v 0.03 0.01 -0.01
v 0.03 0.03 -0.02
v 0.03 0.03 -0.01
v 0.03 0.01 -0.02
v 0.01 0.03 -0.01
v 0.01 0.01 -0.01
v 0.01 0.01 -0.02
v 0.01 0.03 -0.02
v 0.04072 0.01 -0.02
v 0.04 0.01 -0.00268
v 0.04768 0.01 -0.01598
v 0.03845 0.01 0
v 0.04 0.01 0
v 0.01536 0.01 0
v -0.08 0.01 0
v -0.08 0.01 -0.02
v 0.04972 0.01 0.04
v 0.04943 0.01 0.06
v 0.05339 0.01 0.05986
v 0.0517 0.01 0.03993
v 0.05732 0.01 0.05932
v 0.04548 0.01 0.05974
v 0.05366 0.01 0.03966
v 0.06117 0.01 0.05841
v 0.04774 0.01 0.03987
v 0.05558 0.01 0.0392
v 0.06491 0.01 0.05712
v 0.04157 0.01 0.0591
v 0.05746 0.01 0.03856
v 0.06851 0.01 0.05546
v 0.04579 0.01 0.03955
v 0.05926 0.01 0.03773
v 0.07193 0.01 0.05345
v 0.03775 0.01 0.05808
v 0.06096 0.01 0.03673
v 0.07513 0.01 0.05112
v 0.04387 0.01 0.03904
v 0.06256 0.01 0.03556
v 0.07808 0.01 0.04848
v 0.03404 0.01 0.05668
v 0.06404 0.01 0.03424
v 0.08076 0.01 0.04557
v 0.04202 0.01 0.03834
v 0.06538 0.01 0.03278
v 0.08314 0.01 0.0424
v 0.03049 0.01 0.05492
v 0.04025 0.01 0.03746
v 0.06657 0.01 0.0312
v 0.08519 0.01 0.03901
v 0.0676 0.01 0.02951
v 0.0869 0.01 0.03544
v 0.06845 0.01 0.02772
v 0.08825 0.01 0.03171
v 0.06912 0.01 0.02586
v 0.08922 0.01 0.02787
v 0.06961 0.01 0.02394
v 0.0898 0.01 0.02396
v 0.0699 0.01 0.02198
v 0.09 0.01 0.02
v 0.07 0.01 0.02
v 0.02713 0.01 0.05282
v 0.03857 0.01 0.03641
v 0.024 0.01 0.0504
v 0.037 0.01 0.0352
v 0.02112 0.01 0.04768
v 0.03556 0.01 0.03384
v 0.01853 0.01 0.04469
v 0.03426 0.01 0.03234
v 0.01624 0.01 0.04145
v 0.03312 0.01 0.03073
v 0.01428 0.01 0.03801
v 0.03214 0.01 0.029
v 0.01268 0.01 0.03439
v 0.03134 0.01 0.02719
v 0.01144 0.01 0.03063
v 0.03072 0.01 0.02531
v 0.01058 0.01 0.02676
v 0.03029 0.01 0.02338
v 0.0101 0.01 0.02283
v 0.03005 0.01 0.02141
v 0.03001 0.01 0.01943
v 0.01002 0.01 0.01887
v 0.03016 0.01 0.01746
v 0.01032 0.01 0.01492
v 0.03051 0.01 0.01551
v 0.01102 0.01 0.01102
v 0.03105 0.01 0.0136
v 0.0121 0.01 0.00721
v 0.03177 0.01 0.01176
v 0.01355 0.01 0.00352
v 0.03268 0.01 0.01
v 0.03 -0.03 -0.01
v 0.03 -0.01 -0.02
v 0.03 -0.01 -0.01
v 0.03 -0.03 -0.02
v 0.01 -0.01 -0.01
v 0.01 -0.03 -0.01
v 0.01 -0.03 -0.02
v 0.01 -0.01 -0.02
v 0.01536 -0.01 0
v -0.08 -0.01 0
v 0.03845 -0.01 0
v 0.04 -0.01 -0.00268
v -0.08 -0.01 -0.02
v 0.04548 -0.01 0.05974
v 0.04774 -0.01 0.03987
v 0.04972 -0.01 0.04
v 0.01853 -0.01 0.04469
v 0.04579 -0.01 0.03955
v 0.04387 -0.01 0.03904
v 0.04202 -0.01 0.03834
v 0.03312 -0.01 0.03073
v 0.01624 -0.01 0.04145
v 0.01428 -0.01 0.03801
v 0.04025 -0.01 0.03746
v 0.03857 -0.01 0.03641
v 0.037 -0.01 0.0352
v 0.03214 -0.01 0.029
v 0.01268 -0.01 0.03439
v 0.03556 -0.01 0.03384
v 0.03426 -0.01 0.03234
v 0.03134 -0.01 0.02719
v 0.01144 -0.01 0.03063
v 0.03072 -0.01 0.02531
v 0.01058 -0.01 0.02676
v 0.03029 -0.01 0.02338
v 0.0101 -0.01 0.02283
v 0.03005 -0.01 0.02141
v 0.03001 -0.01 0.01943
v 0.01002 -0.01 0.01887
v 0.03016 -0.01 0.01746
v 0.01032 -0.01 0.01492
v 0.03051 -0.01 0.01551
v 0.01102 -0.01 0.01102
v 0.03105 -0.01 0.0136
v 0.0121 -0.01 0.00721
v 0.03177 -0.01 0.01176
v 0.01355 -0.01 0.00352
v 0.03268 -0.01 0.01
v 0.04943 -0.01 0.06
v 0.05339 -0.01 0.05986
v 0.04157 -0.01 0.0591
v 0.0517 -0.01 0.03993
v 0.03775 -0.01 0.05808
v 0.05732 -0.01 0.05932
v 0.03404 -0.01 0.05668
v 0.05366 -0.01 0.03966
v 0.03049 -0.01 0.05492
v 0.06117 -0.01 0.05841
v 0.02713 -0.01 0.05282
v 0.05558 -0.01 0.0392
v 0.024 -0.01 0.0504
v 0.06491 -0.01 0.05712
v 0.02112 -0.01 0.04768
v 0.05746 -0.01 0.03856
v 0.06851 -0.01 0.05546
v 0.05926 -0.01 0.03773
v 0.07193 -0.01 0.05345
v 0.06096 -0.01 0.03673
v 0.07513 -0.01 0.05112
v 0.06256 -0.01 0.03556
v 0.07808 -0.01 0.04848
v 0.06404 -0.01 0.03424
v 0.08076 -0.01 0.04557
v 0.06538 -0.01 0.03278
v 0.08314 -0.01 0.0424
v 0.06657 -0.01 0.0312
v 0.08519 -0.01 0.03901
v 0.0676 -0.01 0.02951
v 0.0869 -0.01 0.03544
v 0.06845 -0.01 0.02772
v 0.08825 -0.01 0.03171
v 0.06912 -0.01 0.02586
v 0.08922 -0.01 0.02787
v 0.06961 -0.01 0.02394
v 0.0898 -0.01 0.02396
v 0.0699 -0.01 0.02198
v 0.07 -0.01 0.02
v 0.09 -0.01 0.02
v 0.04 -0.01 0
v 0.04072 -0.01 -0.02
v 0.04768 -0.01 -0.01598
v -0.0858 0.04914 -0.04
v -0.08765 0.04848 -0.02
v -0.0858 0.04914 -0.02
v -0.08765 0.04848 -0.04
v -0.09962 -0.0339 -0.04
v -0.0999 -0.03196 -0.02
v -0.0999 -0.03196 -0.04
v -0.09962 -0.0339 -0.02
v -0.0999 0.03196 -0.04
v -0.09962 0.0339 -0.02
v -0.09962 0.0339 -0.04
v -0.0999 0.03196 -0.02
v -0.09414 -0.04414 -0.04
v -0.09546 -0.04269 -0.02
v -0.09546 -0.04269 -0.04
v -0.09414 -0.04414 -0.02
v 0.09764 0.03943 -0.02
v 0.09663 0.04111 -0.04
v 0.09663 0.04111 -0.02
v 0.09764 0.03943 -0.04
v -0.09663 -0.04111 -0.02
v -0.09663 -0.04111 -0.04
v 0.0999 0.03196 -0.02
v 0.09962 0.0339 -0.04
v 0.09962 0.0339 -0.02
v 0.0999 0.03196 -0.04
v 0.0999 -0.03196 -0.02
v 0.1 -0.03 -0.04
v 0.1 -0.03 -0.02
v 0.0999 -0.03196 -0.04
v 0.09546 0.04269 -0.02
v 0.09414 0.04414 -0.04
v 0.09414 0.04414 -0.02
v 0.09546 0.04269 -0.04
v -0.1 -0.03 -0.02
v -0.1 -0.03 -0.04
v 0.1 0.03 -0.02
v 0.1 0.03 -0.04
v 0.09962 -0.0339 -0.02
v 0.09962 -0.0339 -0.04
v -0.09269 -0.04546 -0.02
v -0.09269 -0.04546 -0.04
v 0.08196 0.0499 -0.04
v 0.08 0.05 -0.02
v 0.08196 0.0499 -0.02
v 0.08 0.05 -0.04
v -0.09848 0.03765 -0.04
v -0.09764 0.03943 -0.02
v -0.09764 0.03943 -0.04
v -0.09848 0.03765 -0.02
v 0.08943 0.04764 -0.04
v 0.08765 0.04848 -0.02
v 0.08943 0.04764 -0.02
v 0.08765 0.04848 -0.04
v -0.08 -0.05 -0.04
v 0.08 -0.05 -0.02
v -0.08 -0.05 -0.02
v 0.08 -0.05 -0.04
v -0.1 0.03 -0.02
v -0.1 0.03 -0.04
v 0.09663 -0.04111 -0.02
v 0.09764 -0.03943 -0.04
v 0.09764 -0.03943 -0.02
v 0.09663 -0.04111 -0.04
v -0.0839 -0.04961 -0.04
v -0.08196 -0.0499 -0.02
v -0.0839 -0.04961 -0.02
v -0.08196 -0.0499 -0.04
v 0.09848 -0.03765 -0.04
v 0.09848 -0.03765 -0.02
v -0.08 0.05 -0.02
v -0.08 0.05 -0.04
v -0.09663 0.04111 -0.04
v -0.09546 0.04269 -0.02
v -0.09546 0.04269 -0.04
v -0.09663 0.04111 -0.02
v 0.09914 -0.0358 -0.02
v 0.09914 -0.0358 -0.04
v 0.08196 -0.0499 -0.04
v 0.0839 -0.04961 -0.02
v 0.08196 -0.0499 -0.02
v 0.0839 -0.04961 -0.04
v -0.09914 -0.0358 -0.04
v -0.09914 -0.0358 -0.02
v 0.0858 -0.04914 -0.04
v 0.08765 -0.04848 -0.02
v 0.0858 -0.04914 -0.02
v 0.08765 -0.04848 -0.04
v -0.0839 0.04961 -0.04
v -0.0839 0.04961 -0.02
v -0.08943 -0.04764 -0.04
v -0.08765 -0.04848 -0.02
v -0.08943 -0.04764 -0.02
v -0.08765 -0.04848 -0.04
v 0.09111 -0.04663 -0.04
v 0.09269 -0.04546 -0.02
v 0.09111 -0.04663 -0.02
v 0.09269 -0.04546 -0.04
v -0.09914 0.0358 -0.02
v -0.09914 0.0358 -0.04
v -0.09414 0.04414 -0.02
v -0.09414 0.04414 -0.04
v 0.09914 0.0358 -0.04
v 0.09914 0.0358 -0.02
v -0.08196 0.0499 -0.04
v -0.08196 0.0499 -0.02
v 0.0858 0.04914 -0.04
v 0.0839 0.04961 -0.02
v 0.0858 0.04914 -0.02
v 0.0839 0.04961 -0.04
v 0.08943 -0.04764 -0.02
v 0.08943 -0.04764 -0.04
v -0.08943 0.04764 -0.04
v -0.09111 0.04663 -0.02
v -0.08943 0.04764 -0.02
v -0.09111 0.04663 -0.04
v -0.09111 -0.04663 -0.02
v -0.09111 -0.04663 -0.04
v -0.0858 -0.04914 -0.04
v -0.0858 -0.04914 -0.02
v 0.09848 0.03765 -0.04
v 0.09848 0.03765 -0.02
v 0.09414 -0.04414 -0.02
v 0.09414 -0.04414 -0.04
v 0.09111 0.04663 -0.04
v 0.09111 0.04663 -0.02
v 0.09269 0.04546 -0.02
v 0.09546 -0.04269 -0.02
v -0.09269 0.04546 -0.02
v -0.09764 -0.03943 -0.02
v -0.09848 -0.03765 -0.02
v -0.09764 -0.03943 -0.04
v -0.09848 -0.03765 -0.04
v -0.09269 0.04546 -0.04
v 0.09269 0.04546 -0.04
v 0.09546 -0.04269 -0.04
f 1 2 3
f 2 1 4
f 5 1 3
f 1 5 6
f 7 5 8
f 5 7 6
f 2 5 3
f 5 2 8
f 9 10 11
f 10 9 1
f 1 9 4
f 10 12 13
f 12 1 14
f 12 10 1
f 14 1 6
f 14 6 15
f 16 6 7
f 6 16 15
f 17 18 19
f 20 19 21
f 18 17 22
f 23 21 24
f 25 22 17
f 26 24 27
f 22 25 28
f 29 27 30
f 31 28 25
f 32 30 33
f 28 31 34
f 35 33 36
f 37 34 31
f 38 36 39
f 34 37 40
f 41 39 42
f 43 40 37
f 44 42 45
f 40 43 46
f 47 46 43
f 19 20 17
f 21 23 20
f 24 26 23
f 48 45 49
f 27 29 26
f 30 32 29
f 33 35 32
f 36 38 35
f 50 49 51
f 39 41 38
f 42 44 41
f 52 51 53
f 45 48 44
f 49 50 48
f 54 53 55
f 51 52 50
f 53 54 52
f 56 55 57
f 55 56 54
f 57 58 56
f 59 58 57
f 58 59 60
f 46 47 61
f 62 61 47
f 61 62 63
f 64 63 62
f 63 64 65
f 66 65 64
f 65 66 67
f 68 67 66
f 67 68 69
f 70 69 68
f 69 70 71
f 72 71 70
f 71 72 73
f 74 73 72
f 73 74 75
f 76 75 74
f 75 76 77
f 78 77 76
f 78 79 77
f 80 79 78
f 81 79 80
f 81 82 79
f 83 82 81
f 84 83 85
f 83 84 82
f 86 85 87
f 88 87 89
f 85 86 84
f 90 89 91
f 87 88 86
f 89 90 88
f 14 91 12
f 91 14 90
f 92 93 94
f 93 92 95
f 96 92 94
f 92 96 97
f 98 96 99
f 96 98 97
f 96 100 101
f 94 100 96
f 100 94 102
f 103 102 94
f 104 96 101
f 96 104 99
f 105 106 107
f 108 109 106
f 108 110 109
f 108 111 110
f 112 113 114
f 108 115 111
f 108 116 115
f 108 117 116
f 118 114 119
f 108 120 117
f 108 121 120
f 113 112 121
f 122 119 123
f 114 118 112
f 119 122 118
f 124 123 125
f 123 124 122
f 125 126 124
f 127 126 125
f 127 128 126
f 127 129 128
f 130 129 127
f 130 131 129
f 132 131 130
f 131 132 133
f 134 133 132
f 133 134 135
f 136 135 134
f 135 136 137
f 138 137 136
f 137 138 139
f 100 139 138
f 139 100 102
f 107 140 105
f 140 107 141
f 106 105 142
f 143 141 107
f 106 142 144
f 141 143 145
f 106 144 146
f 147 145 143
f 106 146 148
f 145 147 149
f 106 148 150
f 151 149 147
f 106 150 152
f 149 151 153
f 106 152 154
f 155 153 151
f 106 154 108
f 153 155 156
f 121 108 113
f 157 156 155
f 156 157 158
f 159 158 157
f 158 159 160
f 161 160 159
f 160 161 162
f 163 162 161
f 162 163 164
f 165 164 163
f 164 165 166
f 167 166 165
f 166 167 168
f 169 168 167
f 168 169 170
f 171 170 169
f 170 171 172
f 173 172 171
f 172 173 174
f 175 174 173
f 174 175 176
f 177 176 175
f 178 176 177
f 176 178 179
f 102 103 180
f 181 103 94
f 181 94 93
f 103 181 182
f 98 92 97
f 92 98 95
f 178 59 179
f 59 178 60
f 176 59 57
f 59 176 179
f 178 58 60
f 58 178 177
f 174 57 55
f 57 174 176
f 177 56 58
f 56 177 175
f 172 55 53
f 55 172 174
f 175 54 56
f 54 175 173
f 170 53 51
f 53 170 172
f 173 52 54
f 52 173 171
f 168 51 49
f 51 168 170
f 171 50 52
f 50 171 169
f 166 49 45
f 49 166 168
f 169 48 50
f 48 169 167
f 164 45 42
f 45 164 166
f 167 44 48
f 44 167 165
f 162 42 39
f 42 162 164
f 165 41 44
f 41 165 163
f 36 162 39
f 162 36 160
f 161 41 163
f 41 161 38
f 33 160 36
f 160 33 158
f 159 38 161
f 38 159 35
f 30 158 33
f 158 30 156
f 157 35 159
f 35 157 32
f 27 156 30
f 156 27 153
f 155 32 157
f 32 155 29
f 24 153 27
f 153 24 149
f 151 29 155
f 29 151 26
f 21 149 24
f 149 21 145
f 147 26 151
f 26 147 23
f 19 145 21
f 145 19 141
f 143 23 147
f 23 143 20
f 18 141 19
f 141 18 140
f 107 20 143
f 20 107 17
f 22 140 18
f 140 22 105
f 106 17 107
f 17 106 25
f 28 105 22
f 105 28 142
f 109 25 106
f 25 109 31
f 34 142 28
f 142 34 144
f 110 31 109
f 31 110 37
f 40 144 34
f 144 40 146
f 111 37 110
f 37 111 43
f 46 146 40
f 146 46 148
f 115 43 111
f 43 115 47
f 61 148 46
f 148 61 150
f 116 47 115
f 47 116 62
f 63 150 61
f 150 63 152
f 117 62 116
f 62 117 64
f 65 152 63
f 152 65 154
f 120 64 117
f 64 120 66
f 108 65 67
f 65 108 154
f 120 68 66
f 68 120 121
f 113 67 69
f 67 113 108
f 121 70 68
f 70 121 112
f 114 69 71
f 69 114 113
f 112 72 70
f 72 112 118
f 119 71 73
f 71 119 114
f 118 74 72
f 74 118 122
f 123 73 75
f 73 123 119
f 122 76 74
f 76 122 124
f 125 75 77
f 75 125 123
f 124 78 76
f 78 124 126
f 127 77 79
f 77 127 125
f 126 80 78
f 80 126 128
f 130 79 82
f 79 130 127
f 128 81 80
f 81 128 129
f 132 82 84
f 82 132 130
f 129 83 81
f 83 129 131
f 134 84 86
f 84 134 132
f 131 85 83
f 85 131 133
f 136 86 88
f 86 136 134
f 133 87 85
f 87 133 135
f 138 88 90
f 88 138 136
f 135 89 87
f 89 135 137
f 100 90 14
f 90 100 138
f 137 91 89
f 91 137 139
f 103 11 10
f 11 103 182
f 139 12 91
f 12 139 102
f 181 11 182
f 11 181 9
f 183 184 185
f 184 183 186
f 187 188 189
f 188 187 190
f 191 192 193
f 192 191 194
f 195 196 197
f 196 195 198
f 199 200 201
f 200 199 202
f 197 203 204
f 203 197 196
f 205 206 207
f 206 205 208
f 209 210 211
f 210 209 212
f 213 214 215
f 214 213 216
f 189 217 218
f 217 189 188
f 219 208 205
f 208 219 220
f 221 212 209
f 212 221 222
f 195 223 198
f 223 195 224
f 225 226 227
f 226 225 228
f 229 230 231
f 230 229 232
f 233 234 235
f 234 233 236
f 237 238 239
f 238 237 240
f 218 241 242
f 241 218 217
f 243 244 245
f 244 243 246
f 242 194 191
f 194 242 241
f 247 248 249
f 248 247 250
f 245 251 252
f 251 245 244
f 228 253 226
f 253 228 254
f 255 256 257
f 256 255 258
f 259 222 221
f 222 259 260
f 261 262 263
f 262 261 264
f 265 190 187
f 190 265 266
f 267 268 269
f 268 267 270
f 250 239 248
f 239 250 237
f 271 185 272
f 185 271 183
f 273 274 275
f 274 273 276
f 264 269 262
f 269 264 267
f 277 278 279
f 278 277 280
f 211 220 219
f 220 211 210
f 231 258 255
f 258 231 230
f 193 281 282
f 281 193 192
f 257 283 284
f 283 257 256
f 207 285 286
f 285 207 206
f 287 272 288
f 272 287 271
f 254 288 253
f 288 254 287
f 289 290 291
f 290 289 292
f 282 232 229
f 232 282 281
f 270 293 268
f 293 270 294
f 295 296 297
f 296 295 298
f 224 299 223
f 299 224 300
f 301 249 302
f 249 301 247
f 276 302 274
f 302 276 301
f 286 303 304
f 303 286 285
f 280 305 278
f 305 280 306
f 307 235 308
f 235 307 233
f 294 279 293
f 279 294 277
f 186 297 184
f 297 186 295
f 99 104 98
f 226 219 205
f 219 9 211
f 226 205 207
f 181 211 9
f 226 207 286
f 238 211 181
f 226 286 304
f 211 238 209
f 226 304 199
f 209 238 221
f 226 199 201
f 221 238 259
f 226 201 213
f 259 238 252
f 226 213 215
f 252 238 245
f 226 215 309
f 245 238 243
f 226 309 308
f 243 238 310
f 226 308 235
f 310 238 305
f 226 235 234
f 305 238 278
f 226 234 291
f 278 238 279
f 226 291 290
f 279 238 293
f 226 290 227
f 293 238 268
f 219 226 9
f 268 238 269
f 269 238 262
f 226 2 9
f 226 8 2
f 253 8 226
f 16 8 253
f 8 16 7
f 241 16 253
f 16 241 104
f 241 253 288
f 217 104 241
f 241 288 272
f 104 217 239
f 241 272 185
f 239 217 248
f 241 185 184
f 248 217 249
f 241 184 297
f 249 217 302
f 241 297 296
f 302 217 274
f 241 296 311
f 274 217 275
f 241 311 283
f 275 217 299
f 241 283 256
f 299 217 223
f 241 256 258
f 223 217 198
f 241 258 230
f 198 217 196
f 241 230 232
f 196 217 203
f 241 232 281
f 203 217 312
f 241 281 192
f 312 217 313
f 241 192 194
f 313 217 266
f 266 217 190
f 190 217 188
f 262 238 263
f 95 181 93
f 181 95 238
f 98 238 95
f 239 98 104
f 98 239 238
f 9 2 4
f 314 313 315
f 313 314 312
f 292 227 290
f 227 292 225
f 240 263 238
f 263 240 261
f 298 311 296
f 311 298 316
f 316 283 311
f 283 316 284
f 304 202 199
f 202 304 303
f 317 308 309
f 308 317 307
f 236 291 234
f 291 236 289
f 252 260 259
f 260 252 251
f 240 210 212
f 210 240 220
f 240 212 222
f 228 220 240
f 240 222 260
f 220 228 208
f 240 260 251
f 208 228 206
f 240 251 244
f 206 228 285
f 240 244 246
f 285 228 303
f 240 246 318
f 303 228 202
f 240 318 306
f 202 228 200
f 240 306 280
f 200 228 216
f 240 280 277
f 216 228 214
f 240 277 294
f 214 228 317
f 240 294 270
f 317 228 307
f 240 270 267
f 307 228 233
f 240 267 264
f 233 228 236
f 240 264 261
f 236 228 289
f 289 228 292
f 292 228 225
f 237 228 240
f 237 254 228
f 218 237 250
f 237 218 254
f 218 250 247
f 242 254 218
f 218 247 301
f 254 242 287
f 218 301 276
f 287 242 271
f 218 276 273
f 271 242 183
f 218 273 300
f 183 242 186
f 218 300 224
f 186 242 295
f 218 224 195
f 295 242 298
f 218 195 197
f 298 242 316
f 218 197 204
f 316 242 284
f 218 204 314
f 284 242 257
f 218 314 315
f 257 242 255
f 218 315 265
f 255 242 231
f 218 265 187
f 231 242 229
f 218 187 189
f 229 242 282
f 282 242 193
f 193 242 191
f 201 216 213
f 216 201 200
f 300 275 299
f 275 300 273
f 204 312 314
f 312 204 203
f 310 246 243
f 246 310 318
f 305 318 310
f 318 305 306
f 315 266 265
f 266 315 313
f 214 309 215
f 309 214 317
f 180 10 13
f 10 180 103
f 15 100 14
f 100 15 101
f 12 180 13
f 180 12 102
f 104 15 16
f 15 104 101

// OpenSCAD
$fn=64;

L = 0.2;
W = 0.1;
H = 0.1;

module rounded_rect_2d(l, w, r){
    r2 = min(r, min(l,w)/2);
    hull(){
        translate([ l/2 - r2,  w/2 - r2]) circle(r=r2);
        translate([-l/2 + r2,  w/2 - r2]) circle(r=r2);
        translate([ l/2 - r2, -w/2 + r2]) circle(r=r2);
        translate([-l/2 + r2, -w/2 + r2]) circle(r=r2);
    }
}

module base_plate(){
    base_t = 0.02;
    r = 0.02;
    translate([0,0,-H/2 + base_t/2])
        linear_extrude(height=base_t)
            rounded_rect_2d(L, W, r);
}

module rib(){
    base_t = 0.02;
    rib_w = 0.02;
    rib_h = 0.03;
    rib_l = 0.12;
    translate([-0.02, 0, -H/2 + base_t + rib_h/2])
        cube([rib_l, rib_w, rib_h], center=true);
}

module bosses(){
    base_t = 0.02;
    boss_l = 0.02;
    boss_w = 0.02;
    boss_h = 0.02;
    x0 = 0.02;
    z0 = -H/2 + base_t + boss_h/2;
    yoff = 0.02;
    translate([x0,  yoff, z0]) cube([boss_l, boss_w, boss_h], center=true);
    translate([x0, -yoff, z0]) cube([boss_l, boss_w, boss_h], center=true);
}

module hook_arm(){
    base_t = 0.02;
    rib_h = 0.03;
    zc = -H/2 + base_t + rib_h + 0.02;

    arm_r = 0.03;
    arm_th = 0.02;
    arm_w = 0.02;

    x_center = 0.05;
    y_center = 0.0;

    // Curved strap segment (partial torus)
    translate([x_center, y_center, zc])
        rotate([90,0,0])
            rotate_extrude(angle=210, convexity=10)
                translate([arm_r,0,0])
                    square([arm_th, arm_w], center=true);

    // Short rectangular tip with flat end face
    tip_l = 0.03;
    tip_w = 0.02;
    tip_h = 0.02;

    // Place tip near end of arc (approx at 210 degrees)
    ang = 210;
    x_tip = x_center + arm_r*cos(ang);
    z_tip = zc + arm_r*sin(ang);
    // Tangent direction in XZ plane
    rot_y = -(ang + 90);

    translate([x_tip, 0, z_tip])
        rotate([0, rot_y, 0])
            translate([tip_l/2, 0, 0])
                cube([tip_l, tip_w, tip_h], center=true);
}

module bracket(){
    union(){
        base_plate();
        rib();
        bosses();
        hook_arm();
    }
}

bracket();
